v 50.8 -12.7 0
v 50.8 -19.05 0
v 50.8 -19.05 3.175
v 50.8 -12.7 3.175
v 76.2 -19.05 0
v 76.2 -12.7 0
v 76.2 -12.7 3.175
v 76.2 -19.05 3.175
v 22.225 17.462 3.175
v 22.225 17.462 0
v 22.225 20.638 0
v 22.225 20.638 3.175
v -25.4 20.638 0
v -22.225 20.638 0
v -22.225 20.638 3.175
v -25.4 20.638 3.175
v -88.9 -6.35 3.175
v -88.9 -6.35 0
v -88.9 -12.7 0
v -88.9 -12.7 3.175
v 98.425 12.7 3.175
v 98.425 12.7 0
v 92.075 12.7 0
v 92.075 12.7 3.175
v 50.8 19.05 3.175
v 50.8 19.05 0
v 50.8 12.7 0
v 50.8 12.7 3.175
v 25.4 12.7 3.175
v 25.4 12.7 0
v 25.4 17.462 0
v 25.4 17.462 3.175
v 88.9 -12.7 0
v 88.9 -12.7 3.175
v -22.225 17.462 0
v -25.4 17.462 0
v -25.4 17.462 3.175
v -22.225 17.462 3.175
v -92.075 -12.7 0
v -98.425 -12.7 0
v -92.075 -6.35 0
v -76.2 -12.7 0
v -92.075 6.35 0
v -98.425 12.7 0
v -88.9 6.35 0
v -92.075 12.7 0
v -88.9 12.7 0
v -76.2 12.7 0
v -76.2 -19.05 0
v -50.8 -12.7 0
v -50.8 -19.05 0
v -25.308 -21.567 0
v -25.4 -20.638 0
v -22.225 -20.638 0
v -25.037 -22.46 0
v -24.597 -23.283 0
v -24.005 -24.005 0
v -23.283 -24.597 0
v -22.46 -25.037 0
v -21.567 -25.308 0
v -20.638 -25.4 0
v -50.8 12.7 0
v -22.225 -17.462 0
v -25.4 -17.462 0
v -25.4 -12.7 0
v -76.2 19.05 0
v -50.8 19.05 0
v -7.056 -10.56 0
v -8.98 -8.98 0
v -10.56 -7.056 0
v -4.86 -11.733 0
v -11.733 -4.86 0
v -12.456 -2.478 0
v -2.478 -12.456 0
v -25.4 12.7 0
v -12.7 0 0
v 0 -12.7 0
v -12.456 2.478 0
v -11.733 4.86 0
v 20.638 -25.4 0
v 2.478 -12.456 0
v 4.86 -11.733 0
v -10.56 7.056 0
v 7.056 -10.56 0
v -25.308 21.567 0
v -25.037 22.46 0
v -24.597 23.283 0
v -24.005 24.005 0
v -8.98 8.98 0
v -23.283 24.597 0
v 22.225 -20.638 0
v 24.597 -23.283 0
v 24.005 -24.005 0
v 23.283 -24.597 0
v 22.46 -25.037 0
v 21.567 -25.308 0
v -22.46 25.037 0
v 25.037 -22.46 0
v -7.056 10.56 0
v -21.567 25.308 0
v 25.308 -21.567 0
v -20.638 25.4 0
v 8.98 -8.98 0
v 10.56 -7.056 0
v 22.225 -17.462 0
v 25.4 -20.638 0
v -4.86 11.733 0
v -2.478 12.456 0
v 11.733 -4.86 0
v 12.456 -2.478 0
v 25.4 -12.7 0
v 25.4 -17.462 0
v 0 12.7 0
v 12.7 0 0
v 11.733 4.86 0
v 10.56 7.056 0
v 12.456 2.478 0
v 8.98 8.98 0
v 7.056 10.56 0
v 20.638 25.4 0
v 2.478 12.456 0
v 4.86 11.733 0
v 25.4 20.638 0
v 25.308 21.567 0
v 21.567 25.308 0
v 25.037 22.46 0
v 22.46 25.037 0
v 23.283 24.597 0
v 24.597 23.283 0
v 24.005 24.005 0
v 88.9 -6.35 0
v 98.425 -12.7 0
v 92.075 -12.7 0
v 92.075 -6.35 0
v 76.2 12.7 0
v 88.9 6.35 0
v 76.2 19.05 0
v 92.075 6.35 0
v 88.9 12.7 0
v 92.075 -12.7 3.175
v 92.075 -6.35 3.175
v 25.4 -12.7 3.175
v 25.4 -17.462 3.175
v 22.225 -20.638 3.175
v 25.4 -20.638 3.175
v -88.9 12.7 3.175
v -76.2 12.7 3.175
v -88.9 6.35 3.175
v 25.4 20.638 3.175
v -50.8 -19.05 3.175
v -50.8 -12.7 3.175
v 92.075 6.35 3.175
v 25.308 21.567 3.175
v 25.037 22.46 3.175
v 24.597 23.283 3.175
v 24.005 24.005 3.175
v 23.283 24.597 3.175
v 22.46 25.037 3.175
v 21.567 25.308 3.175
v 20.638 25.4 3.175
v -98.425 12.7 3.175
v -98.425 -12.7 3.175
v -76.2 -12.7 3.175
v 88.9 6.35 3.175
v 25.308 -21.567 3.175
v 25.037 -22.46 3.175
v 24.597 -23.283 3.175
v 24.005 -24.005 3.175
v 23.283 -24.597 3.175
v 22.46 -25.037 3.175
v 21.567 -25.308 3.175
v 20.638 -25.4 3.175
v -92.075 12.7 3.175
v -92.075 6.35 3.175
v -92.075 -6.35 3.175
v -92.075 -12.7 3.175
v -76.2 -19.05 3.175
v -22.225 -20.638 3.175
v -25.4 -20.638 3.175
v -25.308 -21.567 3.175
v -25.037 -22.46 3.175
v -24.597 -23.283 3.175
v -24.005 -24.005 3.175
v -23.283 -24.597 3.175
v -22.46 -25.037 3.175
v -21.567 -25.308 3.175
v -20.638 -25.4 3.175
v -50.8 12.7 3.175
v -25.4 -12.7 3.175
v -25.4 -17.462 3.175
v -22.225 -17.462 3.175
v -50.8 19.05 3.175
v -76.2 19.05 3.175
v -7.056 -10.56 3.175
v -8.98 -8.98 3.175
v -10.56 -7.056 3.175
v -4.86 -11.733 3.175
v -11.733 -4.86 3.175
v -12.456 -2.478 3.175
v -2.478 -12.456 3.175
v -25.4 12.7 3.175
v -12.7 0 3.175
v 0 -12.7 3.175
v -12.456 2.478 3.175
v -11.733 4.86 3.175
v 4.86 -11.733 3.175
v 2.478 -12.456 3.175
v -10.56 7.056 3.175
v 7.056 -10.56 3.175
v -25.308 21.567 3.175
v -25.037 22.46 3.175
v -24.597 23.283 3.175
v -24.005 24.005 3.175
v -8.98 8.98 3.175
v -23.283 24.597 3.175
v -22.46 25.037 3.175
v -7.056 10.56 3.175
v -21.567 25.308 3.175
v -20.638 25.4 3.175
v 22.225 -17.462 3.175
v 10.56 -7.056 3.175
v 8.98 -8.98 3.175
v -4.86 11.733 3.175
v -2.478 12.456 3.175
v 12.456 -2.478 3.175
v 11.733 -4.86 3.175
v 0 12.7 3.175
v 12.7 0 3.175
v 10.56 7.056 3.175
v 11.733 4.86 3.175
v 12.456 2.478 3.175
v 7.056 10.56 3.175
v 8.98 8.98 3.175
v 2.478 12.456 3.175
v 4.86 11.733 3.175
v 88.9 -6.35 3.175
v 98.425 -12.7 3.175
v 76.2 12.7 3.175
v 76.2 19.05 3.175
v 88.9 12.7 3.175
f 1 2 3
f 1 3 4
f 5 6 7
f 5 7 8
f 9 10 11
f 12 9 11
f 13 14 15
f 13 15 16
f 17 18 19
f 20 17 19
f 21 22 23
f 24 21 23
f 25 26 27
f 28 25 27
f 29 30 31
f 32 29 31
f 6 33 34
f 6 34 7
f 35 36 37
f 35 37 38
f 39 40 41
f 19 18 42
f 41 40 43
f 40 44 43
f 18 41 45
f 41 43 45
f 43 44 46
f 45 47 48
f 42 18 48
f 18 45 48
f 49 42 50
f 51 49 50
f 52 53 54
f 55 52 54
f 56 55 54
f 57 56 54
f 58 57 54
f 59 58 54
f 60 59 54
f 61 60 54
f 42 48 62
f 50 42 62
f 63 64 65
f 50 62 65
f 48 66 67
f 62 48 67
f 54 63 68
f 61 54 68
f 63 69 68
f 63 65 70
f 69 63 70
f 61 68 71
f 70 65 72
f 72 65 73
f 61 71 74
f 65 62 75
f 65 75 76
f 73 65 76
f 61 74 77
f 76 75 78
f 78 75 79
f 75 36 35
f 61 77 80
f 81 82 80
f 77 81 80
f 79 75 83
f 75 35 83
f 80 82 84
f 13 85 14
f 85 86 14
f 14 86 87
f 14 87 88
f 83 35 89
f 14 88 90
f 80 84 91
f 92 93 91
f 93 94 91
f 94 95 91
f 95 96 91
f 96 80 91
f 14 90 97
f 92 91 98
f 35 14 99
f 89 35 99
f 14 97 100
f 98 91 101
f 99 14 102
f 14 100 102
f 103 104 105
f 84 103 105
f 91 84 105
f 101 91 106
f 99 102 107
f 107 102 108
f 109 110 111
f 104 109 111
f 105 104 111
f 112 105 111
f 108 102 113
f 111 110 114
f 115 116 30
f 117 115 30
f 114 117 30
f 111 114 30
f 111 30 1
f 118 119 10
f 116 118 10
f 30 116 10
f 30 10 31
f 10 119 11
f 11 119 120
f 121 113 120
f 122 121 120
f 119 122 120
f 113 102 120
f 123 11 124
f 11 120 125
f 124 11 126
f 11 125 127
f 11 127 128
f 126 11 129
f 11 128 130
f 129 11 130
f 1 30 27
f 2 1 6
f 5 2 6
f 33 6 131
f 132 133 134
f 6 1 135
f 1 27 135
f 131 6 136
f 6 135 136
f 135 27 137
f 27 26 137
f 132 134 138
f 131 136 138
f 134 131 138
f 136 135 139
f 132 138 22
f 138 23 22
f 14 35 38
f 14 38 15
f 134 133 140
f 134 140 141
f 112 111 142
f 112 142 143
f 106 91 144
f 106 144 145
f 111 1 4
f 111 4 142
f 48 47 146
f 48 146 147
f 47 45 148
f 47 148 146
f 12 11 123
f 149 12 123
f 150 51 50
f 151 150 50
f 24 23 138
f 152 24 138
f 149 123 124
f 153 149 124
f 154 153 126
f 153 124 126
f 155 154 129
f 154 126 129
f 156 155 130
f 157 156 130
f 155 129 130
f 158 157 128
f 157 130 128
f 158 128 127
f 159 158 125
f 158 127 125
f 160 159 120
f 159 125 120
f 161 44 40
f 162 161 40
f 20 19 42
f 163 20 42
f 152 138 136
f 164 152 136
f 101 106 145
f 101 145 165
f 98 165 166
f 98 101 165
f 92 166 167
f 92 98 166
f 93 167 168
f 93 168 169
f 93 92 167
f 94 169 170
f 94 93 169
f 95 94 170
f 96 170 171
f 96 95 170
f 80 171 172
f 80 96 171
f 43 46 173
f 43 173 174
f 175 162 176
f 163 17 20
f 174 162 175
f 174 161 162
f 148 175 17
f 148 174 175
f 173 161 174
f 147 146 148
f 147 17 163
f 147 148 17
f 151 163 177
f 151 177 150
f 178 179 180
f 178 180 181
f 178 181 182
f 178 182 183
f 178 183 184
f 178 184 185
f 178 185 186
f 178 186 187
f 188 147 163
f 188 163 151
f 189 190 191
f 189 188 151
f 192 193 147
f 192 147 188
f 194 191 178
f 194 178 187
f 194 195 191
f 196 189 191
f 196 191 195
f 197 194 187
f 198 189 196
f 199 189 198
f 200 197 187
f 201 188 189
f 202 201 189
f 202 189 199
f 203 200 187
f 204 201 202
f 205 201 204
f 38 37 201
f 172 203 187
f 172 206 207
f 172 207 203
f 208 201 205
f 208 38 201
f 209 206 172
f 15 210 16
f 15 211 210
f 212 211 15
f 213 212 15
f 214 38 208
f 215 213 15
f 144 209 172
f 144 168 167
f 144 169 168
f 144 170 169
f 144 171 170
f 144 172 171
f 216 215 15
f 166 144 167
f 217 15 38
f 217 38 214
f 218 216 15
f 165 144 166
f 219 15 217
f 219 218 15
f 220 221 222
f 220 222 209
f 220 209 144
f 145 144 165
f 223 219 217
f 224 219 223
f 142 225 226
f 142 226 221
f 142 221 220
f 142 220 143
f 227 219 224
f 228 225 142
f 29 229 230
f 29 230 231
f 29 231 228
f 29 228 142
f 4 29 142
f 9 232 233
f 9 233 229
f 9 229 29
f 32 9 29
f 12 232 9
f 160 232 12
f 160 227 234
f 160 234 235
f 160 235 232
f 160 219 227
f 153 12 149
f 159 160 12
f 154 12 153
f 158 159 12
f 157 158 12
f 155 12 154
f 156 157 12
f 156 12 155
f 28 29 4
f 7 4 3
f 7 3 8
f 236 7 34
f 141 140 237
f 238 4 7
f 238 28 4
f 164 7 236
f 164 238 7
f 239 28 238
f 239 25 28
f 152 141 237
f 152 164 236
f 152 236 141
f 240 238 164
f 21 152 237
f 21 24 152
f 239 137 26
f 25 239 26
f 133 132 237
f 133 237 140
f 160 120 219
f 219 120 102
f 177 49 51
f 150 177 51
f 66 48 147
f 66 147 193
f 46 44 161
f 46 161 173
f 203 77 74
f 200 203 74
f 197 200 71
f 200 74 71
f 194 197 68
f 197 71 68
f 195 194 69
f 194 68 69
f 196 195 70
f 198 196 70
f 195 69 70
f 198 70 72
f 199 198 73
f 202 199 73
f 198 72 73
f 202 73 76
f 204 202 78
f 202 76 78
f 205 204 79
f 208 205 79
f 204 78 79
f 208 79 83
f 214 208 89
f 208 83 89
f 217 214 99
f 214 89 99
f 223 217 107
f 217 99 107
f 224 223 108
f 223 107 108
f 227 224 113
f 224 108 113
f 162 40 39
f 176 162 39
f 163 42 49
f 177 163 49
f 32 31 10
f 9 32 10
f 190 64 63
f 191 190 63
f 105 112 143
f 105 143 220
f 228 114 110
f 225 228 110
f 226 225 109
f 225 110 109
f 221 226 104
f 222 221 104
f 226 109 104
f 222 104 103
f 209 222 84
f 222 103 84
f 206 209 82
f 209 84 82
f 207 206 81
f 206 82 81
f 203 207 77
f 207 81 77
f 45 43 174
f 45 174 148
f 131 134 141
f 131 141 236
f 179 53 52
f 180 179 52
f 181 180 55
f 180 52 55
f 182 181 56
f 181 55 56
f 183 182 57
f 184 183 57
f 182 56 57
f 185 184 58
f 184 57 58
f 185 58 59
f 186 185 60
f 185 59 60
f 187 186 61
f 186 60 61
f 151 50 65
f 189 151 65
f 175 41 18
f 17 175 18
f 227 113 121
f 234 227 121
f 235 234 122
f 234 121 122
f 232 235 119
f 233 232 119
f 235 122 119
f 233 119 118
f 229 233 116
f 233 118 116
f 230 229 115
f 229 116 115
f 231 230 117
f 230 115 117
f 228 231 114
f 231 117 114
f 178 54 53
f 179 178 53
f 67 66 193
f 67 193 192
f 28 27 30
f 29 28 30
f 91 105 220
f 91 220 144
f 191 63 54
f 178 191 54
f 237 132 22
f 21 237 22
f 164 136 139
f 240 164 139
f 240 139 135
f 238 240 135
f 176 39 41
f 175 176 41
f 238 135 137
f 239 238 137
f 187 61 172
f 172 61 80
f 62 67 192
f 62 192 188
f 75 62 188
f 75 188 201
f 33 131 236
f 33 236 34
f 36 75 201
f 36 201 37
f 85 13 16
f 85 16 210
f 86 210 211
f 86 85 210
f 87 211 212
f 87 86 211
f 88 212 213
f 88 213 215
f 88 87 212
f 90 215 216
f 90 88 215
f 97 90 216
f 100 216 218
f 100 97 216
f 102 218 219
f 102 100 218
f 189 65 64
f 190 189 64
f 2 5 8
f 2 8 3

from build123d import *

# Parameters (mm, degrees)
BOSS_EXTRUDE1_DEPTH = 3.175
CUT_EXTRUDE3_DEPTH  = 3.175


with BuildPart() as part:
    # Sketch2 → Boss-Extrude1 (new body)
    with BuildSketch(Plane.XY):
        with BuildLine():
            Line((0, 12.7), (0, 25.4))
            Line((0, 25.4), (-98.425, 25.4))
            Line((-98.425, 25.4), (-98.425, -25.4))
            Line((-98.425, -25.4), (0, -25.4))
            Line((0, -25.4), (0, -12.7))
            ThreePointArc((0, -12.7), (-12.7, 0), (0, 12.7))
        make_face()
        with BuildLine():
            Line((98.425, 25.4), (0, 25.4))
            Line((0, 25.4), (0, 12.7))
            ThreePointArc((0, 12.7), (8.980256121, 8.980256121), (12.7, 0))
            ThreePointArc((12.7, 0), (8.980256121, -8.980256121), (0, -12.7))
            Line((0, -12.7), (0, -25.4))
            Line((0, -25.4), (98.425, -25.4))
            Line((98.425, -25.4), (98.425, 25.4))
        make_face()
    extrude(amount=BOSS_EXTRUDE1_DEPTH)

    # Sketch6 → Cut-Extrude3 (cut)
    with BuildSketch(Plane.XY):
        with BuildLine():
            Line((-22.225, 20.6375), (-25.4, 20.6375))
            ThreePointArc((-25.4, 20.6375), (-24.005096045, 24.005096045), (-20.6375, 25.4))
            Line((-20.6375, 25.4), (-25.4, 25.4))
            Line((-25.4, 25.4), (-98.425, 25.4))
            Line((-98.425, 25.4), (-98.425, 12.7))
            Line((-98.425, 12.7), (-92.075, 12.7))
            Line((-92.075, 12.7), (-92.075, 6.35))
            Line((-92.075, 6.35), (-88.9, 6.35))
            Line((-88.9, 6.35), (-88.9, 12.7))
            Line((-88.9, 12.7), (-76.2, 12.7))
            Line((-76.2, 12.7), (-76.2, 19.05))
            Line((-76.2, 19.05), (-50.8, 19.05))
            Line((-50.8, 19.05), (-50.8, 12.7))
            Line((-50.8, 12.7), (-25.4, 12.7))
            Line((-25.4, 12.7), (-25.4, 17.4625))
            Line((-25.4, 17.4625), (-22.225, 17.4625))
            Line((-22.225, 17.4625), (-22.225, 20.6375))
        make_face()
        with BuildLine():
            ThreePointArc((25.4, 20.6375), (24.005096045, 24.005096045), (20.6375, 25.4))
            Line((20.6375, 25.4), (25.4, 25.4))
            Line((25.4, 25.4), (98.425, 25.4))
            Line((98.425, 25.4), (98.425, 12.7))
            Line((98.425, 12.7), (92.075, 12.7))
            Line((92.075, 12.7), (92.075, 6.35))
            Line((92.075, 6.35), (88.9, 6.35))
            Line((88.9, 6.35), (88.9, 12.7))
            Line((88.9, 12.7), (76.2, 12.7))
            Line((76.2, 12.7), (76.2, 19.05))
            Line((76.2, 19.05), (50.8, 19.05))
            Line((50.8, 19.05), (50.8, 12.7))
            Line((50.8, 12.7), (25.4, 12.7))
            Line((25.4, 12.7), (25.4, 17.4625))
            Line((25.4, 17.4625), (22.225, 17.4625))
            Line((22.225, 17.4625), (22.225, 20.6375))
            Line((22.225, 20.6375), (25.4, 20.6375))
        make_face()
        with BuildLine():
            ThreePointArc((-25.4, -20.6375), (-24.005096045, -24.005096045), (-20.6375, -25.4))
            Line((-20.6375, -25.4), (-25.4, -25.4))
            Line((-25.4, -25.4), (-98.425, -25.4))
            Line((-98.425, -25.4), (-98.425, -12.7))
            Line((-98.425, -12.7), (-92.075, -12.7))
            Line((-92.075, -12.7), (-92.075, -6.35))
            Line((-92.075, -6.35), (-88.9, -6.35))
            Line((-88.9, -6.35), (-88.9, -12.7))
            Line((-88.9, -12.7), (-76.2, -12.7))
            Line((-76.2, -12.7), (-76.2, -19.05))
            Line((-76.2, -19.05), (-50.8, -19.05))
            Line((-50.8, -19.05), (-50.8, -12.7))
            Line((-50.8, -12.7), (-25.4, -12.7))
            Line((-25.4, -12.7), (-25.4, -17.4625))
            Line((-25.4, -17.4625), (-22.225, -17.4625))
            Line((-22.225, -17.4625), (-22.225, -20.6375))
            Line((-22.225, -20.6375), (-25.4, -20.6375))
        make_face()
        with BuildLine():
            Line((22.225, -20.6375), (25.4, -20.6375))
            ThreePointArc((25.4, -20.6375), (24.005096045, -24.005096045), (20.6375, -25.4))
            Line((20.6375, -25.4), (25.4, -25.4))
            Line((25.4, -25.4), (98.425, -25.4))
            Line((98.425, -25.4), (98.425, -12.7))
            Line((98.425, -12.7), (92.075, -12.7))
            Line((92.075, -12.7), (92.075, -6.35))
            Line((92.075, -6.35), (88.9, -6.35))
            Line((88.9, -6.35), (88.9, -12.7))
            Line((88.9, -12.7), (76.2, -12.7))
            Line((76.2, -12.7), (76.2, -19.05))
            Line((76.2, -19.05), (50.8, -19.05))
            Line((50.8, -19.05), (50.8, -12.7))
            Line((50.8, -12.7), (25.4, -12.7))
            Line((25.4, -12.7), (25.4, -17.4625))
            Line((25.4, -17.4625), (22.225, -17.4625))
            Line((22.225, -17.4625), (22.225, -20.6375))
        make_face()
    extrude(amount=CUT_EXTRUDE3_DEPTH, mode=Mode.SUBTRACT)


solid = part.part
